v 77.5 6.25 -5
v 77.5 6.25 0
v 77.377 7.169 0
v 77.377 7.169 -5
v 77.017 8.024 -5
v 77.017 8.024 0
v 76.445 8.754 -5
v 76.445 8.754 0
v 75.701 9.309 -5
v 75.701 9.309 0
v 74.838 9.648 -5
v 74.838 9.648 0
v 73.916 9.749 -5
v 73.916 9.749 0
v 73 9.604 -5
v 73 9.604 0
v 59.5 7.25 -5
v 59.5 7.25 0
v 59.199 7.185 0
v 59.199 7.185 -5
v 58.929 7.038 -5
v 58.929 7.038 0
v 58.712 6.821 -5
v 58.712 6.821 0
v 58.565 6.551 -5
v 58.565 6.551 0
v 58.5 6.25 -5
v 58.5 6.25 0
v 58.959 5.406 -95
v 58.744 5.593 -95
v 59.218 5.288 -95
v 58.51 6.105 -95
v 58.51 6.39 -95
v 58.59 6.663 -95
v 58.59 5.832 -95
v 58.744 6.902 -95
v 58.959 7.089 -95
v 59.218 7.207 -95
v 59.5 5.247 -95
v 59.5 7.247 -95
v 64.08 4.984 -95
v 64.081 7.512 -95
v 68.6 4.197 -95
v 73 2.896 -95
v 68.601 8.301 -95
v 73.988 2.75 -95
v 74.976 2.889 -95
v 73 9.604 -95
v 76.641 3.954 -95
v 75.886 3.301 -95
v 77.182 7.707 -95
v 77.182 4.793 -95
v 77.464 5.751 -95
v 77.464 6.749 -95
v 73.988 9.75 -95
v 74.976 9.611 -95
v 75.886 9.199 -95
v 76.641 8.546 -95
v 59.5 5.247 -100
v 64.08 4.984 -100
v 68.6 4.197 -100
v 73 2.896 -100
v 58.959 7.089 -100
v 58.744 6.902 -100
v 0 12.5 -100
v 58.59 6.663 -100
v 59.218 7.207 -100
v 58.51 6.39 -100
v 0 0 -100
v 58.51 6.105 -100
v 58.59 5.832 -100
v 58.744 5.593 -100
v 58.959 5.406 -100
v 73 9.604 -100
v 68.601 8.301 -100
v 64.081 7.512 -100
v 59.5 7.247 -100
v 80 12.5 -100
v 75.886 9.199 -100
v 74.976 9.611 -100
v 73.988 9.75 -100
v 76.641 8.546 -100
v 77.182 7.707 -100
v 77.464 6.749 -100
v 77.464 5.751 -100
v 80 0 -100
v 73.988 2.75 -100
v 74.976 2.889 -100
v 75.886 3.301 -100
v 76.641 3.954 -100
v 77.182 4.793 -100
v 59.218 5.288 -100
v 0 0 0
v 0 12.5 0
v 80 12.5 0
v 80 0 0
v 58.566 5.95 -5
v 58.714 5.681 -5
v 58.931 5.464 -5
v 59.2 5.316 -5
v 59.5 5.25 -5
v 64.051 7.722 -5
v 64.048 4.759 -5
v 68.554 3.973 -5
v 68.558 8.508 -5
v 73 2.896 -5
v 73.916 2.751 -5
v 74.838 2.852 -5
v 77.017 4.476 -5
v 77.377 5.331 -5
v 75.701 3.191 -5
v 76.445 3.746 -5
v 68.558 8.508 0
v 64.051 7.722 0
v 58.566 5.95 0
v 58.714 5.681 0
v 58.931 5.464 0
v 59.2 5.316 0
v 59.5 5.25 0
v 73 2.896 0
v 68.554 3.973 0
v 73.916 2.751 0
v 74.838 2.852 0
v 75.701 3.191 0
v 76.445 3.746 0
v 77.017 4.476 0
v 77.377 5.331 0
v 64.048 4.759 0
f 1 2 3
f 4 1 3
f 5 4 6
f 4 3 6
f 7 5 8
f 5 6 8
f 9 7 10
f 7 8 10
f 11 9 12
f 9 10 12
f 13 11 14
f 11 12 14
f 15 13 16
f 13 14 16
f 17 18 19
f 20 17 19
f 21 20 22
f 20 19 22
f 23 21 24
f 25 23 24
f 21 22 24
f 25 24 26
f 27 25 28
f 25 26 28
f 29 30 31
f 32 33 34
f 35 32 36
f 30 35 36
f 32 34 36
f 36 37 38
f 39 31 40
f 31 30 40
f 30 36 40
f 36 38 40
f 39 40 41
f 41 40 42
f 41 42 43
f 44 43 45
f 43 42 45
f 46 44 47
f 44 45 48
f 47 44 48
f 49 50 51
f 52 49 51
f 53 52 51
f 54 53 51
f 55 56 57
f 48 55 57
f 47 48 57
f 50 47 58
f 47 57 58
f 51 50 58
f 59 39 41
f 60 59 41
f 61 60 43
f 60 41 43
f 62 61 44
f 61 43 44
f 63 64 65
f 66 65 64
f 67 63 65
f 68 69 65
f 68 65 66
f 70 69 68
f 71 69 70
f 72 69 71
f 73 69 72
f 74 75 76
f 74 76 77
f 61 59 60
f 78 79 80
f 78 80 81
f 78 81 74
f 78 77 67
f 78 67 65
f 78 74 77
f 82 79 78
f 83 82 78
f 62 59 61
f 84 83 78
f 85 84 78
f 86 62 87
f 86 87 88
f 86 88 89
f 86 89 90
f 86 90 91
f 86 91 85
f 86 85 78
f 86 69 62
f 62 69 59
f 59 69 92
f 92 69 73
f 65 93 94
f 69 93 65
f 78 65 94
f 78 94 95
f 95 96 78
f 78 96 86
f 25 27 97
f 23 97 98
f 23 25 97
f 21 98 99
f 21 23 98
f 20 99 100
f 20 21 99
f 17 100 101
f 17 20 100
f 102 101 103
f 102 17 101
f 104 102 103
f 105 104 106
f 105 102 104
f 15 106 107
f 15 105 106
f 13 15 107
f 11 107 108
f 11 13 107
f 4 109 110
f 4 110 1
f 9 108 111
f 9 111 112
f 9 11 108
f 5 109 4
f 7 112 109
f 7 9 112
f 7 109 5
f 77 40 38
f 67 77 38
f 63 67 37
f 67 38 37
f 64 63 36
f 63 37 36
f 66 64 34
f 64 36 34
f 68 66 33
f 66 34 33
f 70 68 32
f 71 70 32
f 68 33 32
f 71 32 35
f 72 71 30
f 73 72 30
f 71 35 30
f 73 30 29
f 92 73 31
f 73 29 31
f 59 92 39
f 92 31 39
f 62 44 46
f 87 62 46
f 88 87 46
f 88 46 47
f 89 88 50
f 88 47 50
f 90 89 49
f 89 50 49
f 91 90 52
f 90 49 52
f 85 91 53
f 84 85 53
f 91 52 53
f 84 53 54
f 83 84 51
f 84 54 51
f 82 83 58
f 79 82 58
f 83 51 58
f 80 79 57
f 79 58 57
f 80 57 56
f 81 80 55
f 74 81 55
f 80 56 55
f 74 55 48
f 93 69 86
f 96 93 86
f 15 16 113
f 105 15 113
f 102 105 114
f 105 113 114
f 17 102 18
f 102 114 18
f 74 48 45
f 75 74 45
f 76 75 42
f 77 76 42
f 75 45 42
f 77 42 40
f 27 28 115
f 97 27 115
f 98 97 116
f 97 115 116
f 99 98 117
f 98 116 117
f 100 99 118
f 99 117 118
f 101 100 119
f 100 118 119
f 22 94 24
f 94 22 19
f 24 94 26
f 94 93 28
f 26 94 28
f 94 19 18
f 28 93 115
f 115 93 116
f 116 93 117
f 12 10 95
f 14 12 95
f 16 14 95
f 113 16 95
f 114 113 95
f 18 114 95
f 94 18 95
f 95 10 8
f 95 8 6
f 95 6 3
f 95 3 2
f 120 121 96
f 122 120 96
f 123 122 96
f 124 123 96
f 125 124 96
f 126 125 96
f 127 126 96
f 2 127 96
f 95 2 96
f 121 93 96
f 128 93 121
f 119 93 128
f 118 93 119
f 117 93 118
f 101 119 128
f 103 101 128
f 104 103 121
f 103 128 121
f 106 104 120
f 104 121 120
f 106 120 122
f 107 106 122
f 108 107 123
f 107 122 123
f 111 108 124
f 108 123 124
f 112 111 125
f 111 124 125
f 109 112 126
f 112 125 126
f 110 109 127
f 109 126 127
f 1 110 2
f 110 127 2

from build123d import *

# Parameters (mm, degrees)
SKETCH1_W           = 80
SKETCH1_H           = 100
BOSS_EXTRUDE1_DEPTH = 12.5
CUT_EXTRUDE1_DEPTH  = 5
CUT_EXTRUDE4_START  = 5
CUT_EXTRUDE4_DEPTH  = 5


with BuildPart() as part:
    # Sketch1 → Boss-Extrude1 (new body)
    with BuildSketch(Plane(origin=(0, 0, 0), x_dir=(1, 0, 0), z_dir=(0, 1, 0))):
        with Locations((40, 50)):
            Rectangle(SKETCH1_W, SKETCH1_H)
    extrude(amount=BOSS_EXTRUDE1_DEPTH)

    # Sketch2 → Cut-Extrude1 (cut)
    with BuildSketch(Plane.XY):
        with BuildLine():
            ThreePointArc((73, 2.895898034), (76.091650066, 3.44375696), (77.5, 6.25))
            Line((77.5, 6.25), (74, 6.25))
            Line((74, 6.25), (73, 6.25))
            Line((73, 6.25), (73, 2.895898034))
        make_face()
        with BuildLine():
            Line((74, 6.25), (77.5, 6.25))
            ThreePointArc((77.5, 6.25), (76.091650066, 9.05624304), (73, 9.604101966))
            Line((73, 9.604101966), (73, 6.25))
            Line((73, 6.25), (74, 6.25))
        make_face()
        with BuildLine():
            Line((73, 6.25), (73, 9.604101966))
            ThreePointArc((73, 9.604101966), (71.19375696, 8.341650066), (70.5, 6.25))
            Line((70.5, 6.25), (73, 6.25))
        make_face()
        with BuildLine():
            ThreePointArc((70.5, 6.25), (71.19375696, 4.158349934), (73, 2.895898034))
            Line((73, 2.895898034), (73, 6.25))
            Line((73, 6.25), (70.5, 6.25))
        make_face()
        with BuildLine():
            ThreePointArc((59.5, 5.25), (66.307499895, 4.402691993), (73, 2.895898034))
            ThreePointArc((73, 2.895898034), (71.19375696, 4.158349934), (70.5, 6.25))
            Line((70.5, 6.25), (59.5, 6.25))
            Line((59.5, 6.25), (58.5, 6.25))
            ThreePointArc((58.5, 6.25), (58.814539324, 5.564539324), (59.5, 5.25))
        make_face()
        with BuildLine():
            ThreePointArc((70.5, 6.25), (71.19375696, 8.341650066), (73, 9.604101966))
            ThreePointArc((73, 9.604101966), (66.311170081, 8.076260701), (59.5, 7.25))
            ThreePointArc((59.5, 7.25), (58.812768212, 6.937231788), (58.5, 6.25))
            Line((58.5, 6.25), (59.5, 6.25))
            Line((59.5, 6.25), (70.5, 6.25))
        make_face()
    extrude(amount=-CUT_EXTRUDE1_DEPTH, mode=Mode.SUBTRACT)

    # Sketch6 → Cut-Extrude4 (cut)
    with BuildSketch(Plane.XY.offset(-100).offset(CUT_EXTRUDE4_START)):
        with BuildLine():
            ThreePointArc((73, 2.895898034), (77.5, 6.25), (73, 9.604101966))
            ThreePointArc((73, 9.604101966), (66.352079757, 7.840991059), (59.499996599, 7.247391846))
            ThreePointArc((59.499996599, 7.247391846), (58.499996599, 6.247391846), (59.499996599, 5.247391846))
            ThreePointArc((59.499996599, 5.247391846), (66.351631714, 4.655125717), (73, 2.895898034))
        make_face()
    extrude(amount=-CUT_EXTRUDE4_DEPTH, mode=Mode.SUBTRACT)


solid = part.part
